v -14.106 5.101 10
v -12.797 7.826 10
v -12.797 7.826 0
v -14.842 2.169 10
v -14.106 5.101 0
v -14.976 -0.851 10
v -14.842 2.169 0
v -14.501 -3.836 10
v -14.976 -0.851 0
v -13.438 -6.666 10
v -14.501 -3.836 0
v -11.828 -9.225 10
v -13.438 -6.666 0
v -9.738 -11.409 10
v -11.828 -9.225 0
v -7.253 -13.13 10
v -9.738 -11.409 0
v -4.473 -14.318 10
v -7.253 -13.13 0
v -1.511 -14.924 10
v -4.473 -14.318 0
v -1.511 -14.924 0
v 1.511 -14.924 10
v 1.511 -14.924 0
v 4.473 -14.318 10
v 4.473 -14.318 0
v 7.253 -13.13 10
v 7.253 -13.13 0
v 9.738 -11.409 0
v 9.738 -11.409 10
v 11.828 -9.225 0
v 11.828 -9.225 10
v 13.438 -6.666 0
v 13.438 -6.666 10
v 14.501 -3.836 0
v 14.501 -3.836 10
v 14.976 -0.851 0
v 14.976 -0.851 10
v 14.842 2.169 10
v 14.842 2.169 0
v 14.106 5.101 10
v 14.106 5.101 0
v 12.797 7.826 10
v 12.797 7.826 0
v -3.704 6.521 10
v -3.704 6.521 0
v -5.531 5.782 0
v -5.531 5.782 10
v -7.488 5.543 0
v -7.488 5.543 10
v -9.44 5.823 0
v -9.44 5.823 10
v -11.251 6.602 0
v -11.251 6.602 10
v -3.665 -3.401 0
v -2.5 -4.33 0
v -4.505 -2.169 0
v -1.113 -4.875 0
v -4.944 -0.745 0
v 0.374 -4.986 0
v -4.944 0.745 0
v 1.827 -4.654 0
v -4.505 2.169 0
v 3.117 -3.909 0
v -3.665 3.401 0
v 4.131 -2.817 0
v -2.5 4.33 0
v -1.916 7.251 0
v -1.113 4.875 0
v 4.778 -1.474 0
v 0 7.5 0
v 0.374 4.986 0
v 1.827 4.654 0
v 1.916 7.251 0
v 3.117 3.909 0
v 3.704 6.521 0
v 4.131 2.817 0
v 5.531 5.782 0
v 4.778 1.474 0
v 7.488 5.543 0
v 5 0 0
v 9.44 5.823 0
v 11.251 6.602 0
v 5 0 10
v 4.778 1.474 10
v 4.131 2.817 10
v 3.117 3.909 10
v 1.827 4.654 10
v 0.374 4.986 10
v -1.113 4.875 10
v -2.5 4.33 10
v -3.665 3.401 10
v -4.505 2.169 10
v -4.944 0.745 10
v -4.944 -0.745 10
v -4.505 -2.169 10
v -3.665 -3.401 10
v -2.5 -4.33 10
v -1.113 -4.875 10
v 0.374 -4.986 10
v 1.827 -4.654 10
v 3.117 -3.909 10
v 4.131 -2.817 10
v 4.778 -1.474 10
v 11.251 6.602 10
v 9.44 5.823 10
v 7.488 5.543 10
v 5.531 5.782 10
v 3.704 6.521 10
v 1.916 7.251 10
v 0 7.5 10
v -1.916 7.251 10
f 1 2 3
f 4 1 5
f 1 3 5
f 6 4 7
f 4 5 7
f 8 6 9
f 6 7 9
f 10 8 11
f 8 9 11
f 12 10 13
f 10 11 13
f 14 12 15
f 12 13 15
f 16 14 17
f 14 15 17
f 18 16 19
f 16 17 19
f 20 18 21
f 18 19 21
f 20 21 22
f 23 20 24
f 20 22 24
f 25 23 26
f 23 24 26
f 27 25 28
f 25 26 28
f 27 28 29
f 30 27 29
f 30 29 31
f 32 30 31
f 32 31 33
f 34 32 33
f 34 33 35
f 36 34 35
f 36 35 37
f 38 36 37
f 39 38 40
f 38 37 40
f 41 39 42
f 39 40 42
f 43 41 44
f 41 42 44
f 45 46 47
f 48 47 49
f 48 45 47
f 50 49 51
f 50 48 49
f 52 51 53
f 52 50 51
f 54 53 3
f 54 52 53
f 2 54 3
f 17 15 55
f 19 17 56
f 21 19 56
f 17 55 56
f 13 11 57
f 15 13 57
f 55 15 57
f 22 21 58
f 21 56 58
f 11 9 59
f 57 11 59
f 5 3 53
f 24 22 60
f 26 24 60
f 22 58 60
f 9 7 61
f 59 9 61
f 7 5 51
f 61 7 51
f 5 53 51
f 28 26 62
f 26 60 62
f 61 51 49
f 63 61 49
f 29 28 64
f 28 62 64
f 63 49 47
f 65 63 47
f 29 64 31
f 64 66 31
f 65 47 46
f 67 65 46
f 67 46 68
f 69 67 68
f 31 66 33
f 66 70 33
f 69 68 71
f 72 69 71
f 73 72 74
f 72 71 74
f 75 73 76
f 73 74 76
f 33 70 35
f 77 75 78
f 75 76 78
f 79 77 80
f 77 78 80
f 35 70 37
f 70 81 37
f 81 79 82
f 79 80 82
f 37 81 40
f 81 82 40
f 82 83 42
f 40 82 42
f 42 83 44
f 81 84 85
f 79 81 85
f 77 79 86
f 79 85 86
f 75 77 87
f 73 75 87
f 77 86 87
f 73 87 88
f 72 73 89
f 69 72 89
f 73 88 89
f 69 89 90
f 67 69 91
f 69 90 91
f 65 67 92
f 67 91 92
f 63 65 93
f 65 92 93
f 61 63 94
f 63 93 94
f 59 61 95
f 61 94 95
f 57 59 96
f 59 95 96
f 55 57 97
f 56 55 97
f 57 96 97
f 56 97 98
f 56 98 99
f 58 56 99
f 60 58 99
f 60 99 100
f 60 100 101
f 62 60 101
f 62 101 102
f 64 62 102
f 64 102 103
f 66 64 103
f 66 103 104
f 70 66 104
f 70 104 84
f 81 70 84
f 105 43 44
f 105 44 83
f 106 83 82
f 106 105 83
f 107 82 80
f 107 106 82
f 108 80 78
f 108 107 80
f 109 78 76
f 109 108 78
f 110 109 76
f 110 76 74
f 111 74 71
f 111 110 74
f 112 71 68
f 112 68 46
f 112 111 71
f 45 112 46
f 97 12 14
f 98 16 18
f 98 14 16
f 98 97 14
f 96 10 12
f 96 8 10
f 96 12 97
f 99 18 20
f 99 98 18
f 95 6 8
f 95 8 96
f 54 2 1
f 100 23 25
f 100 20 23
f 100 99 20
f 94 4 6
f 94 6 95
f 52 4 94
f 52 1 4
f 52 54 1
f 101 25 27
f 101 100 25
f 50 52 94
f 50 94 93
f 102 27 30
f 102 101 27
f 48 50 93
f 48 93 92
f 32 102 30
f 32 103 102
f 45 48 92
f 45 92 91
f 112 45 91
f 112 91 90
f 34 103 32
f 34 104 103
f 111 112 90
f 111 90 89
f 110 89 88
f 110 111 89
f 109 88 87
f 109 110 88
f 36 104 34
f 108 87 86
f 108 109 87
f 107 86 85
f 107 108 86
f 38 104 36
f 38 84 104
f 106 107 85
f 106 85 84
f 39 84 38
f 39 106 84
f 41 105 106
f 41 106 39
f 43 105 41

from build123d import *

# Parameters (mm, degrees)
SKETCH2_R           = 15
BOSS_EXTRUDE1_DEPTH = 10
CUT_EXTRUDE1_REACH  = 25.452
SKETCH3_R           = 5
CUT_EXTRUDE2_DEPTH  = 24.452078799


with BuildPart() as part:
    # Sketch2 → Boss-Extrude1 (new body)
    with BuildSketch(Plane.XY):
        Circle(SKETCH2_R)
    extrude(amount=BOSS_EXTRUDE1_DEPTH)

    # Sketch3 → Cut-Extrude1 (cut, up to next)
    with BuildSketch(Plane.XY.offset(10), mode=Mode.PRIVATE) as cut_extrude1_sk1:
        Circle(SKETCH3_R)
    cut_extrude1_tool1 = extrude(cut_extrude1_sk1.sketch, amount=-CUT_EXTRUDE1_REACH, mode=Mode.PRIVATE) & part.part
    add(cut_extrude1_tool1.solids().sort_by_distance((0, 0, 10))[0], mode=Mode.SUBTRACT)

    # Sketch7 → Cut-Extrude2 (cut, through all)
    with BuildSketch(Plane.XY.offset(10)):
        with BuildLine():
            ThreePointArc((3.70412729, 6.521460037), (0, 7.5), (-3.70412729, 6.521460037))
            ThreePointArc((-3.70412729, 6.521460037), (-14.165401159, 16.297297145), (0, 14.212434533))
            ThreePointArc((0, 14.212434533), (14.165401159, 16.297297145), (3.70412729, 6.521460037))
        make_face()
    extrude(amount=-CUT_EXTRUDE2_DEPTH, mode=Mode.SUBTRACT)


with BuildPart() as body_2:
    # of the pieces the cut leaves, the one that is kept (cut_extrude2_keep)
    add(part.part.solids().sort_by_distance((-12.796599287, 7.826049238, 0))[0])


solid = body_2.part
